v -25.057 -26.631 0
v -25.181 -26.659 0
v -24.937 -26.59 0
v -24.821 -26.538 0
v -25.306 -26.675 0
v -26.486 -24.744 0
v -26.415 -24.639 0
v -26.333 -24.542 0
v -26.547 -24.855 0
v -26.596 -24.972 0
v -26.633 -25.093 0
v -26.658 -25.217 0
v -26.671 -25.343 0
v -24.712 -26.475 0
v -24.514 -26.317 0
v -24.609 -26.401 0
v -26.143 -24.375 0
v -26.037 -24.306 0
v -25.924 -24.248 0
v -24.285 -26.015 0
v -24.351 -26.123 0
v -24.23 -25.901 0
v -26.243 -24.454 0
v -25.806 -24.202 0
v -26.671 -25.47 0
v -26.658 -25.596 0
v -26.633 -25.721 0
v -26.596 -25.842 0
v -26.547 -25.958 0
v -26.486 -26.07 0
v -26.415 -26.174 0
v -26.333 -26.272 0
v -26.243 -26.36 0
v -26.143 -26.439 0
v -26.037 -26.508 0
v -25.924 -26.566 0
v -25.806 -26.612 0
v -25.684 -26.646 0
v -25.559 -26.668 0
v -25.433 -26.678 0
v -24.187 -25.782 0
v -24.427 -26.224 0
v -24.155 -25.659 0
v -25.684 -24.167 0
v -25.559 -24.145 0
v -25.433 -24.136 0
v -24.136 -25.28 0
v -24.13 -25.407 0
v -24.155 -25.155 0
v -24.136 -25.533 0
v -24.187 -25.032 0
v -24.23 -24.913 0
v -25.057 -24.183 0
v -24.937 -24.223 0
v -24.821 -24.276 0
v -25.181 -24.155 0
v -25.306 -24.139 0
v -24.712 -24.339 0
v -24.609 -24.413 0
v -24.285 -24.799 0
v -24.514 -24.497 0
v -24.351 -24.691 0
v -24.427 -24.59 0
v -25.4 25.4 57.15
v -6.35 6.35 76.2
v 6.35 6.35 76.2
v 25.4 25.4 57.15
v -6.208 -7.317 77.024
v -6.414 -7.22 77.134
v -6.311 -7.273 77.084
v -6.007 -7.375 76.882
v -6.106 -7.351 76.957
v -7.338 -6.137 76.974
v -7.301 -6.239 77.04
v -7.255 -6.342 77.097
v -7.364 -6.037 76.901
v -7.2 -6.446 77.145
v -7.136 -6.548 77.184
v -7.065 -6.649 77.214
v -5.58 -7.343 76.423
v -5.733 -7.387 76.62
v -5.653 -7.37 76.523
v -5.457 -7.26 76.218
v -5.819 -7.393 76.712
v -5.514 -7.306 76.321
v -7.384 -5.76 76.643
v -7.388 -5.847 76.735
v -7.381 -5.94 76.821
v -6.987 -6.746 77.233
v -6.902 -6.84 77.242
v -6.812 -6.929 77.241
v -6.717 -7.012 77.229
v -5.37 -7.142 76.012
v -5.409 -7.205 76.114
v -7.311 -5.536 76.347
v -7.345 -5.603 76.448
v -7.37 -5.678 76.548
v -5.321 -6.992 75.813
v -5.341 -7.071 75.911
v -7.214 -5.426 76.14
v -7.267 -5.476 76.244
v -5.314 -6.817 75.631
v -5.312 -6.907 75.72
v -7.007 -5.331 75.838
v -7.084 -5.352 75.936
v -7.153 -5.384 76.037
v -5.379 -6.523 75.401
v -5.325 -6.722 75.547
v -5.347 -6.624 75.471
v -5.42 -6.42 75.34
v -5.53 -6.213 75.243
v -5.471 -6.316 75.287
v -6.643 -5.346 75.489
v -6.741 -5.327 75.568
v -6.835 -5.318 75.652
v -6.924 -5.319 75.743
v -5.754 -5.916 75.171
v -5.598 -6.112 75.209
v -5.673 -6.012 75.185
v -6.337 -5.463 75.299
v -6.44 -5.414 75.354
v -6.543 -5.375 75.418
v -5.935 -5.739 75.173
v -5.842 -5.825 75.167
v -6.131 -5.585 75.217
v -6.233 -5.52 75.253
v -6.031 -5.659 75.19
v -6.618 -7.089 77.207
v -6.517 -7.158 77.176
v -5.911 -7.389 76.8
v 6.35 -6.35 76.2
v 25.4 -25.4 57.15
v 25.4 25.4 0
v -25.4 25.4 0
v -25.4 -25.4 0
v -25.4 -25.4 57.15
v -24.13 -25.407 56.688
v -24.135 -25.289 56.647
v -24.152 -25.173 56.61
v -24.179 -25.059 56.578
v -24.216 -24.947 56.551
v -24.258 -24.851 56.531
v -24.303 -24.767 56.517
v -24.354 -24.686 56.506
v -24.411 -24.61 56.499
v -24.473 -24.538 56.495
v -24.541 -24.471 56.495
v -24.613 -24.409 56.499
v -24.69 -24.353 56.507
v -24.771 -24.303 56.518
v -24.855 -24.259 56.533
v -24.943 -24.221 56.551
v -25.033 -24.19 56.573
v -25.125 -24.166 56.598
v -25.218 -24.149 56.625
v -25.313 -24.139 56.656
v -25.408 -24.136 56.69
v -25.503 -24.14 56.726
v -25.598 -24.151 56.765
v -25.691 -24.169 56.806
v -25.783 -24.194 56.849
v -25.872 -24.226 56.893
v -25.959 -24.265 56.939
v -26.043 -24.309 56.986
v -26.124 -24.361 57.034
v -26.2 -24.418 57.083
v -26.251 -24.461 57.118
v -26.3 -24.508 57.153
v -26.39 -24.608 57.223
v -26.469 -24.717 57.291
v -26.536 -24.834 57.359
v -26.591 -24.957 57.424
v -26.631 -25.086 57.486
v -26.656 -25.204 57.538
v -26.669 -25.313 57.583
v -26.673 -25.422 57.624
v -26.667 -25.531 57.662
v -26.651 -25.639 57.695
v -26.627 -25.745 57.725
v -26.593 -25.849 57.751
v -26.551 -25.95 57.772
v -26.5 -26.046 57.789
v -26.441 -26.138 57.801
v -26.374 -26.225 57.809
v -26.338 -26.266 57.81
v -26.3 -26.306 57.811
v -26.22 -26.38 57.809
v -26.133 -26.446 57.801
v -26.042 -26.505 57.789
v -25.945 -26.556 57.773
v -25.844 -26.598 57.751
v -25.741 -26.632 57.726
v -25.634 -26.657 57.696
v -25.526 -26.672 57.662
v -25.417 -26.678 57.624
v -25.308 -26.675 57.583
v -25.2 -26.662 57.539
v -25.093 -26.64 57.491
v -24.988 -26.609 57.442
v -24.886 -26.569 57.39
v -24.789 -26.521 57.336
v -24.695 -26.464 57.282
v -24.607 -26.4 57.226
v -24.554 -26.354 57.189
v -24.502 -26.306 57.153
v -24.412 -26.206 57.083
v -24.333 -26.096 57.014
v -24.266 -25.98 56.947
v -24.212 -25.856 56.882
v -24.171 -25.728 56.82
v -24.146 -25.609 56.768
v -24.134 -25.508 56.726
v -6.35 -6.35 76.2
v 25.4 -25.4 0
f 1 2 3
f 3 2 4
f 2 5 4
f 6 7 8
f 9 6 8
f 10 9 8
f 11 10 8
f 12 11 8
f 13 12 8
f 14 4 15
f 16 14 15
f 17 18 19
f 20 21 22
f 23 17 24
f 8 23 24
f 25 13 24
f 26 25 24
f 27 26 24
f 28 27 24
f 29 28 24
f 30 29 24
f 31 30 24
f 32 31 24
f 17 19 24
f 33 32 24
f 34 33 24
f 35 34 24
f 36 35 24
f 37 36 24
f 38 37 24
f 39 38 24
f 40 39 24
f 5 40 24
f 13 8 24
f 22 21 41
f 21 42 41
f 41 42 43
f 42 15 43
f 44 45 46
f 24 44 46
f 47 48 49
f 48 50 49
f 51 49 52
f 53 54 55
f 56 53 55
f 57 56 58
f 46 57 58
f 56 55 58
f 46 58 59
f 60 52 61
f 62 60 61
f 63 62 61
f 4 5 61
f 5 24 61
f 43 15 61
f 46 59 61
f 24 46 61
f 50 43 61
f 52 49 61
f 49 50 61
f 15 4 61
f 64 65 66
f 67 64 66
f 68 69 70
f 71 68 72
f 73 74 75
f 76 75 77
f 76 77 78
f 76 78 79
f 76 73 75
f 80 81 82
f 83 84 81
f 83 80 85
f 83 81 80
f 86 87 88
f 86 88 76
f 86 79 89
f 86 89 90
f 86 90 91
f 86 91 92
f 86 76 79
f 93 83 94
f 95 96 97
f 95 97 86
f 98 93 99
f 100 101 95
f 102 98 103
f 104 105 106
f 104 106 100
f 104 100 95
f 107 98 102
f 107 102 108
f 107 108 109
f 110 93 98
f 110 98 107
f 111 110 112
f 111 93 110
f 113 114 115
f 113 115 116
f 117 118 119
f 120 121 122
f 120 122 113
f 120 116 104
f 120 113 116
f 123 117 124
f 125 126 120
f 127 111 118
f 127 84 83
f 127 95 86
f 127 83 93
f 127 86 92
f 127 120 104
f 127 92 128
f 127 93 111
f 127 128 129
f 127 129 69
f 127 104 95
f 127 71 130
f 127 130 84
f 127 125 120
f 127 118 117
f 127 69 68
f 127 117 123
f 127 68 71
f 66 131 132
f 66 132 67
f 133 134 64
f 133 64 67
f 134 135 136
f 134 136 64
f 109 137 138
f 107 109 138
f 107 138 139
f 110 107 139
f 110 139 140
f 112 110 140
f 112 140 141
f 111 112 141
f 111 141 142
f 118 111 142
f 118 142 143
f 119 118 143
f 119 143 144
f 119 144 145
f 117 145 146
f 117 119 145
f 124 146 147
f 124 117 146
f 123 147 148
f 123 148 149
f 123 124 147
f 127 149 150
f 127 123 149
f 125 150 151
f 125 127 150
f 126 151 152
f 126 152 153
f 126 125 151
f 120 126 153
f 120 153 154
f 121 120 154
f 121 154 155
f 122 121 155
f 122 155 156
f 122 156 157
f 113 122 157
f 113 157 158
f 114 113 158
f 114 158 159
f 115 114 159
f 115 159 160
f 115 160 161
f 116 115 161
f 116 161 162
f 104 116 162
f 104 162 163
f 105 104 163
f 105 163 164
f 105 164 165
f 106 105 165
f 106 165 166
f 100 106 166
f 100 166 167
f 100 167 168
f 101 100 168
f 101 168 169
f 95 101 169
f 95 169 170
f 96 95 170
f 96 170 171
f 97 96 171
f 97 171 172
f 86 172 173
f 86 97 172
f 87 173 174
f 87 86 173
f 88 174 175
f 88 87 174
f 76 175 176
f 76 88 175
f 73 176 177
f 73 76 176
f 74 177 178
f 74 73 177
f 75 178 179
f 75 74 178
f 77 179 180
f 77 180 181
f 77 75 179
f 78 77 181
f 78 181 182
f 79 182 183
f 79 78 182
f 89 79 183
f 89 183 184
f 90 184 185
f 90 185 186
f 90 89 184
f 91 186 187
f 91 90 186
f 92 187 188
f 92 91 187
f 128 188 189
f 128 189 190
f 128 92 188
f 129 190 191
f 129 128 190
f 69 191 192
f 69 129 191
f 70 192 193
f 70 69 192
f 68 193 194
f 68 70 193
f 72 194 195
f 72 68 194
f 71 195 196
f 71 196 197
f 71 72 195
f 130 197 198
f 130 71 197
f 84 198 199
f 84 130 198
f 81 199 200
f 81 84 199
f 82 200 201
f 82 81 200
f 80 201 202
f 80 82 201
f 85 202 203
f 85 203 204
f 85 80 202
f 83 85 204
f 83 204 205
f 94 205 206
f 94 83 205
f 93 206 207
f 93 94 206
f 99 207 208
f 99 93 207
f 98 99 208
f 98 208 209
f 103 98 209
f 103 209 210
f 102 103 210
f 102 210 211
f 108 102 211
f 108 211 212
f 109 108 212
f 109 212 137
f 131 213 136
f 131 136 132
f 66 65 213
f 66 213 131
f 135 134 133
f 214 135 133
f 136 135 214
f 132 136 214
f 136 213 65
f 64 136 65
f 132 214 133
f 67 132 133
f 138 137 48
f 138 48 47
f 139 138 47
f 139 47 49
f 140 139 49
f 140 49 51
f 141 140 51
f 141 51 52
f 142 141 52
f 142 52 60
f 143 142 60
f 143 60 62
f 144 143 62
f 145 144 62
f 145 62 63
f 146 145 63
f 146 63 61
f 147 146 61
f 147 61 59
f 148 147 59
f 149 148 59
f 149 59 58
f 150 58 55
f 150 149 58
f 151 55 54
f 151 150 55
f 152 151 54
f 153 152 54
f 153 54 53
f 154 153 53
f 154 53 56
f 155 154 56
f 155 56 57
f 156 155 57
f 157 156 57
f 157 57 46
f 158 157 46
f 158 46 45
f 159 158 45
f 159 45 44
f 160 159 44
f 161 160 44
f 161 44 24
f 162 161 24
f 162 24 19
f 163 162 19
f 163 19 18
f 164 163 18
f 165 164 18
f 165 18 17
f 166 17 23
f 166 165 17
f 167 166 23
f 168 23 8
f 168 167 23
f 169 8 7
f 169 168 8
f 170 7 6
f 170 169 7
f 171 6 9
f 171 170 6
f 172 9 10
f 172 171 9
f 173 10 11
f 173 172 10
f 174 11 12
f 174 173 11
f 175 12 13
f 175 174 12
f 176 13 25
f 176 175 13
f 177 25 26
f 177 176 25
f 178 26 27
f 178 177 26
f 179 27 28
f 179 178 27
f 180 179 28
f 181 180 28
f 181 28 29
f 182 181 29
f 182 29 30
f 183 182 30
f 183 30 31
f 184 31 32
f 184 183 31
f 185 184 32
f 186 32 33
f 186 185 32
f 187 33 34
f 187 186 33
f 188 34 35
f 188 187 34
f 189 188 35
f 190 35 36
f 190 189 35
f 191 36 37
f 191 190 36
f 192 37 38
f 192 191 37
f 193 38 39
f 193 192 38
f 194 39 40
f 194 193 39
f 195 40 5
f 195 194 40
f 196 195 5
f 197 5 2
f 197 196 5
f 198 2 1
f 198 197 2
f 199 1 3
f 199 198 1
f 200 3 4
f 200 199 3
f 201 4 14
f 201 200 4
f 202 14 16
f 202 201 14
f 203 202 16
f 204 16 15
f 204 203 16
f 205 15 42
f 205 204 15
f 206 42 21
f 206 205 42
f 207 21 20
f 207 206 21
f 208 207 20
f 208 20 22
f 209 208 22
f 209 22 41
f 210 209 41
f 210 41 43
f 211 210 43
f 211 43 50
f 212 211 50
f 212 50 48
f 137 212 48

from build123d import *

# Parameters (mm, degrees)
F0_W     = 50.8
F0_H     = 50.8
F1_DEPTH = 50.8
F2_DEPTH = 25.4
F3_SIZE  = 19.05
F4_R     = 1.2712774292


with BuildPart() as f1:
    # F0 (on Top) → F1 (new body)
    with BuildSketch(Plane.XY):
        Rectangle(F0_W, F0_H)
    extrude(amount=F1_DEPTH)

    # F2 (add): a face of the model
    f2_faces = [f1.faces().sort_by_distance(p)[0] for p in [
        (0, 0, 50.8),
    ]]
    extrude(f2_faces, amount=F2_DEPTH)

    # F3
    f3_edges = [f1.edges().sort_by_distance(p)[0] for p in [
        (0, 25.4, 76.2),
        (25.4, 0, 76.2),
        (0, -25.4, 76.2),
        (-25.4, 0, 76.2),
    ]]
    chamfer(f3_edges, length=F3_SIZE)


with BuildPart() as f5:
    # F5: sweep along a path in F5_path
    with BuildLine(Plane(origin=(-25.4, -25.4, 0), x_dir=(-0.7071067812, -0.7071067812, 0), z_dir=(0.7071067812, -0.7071067812, 0))) as f5_path:
        Line((0, 0), (0, -57.15))
        Line((0, -57.15), (-26.9407683632, -76.2))
    # F4 (on Top) → F5 (sweep)
    with BuildSketch(Plane.XY):
        with Locations((-25.401333347, -25.4068169743)):
            Circle(F4_R)
    sweep(path=f5_path.line, transition=Transition.RIGHT)


solid = Compound([f1.part, f5.part])
